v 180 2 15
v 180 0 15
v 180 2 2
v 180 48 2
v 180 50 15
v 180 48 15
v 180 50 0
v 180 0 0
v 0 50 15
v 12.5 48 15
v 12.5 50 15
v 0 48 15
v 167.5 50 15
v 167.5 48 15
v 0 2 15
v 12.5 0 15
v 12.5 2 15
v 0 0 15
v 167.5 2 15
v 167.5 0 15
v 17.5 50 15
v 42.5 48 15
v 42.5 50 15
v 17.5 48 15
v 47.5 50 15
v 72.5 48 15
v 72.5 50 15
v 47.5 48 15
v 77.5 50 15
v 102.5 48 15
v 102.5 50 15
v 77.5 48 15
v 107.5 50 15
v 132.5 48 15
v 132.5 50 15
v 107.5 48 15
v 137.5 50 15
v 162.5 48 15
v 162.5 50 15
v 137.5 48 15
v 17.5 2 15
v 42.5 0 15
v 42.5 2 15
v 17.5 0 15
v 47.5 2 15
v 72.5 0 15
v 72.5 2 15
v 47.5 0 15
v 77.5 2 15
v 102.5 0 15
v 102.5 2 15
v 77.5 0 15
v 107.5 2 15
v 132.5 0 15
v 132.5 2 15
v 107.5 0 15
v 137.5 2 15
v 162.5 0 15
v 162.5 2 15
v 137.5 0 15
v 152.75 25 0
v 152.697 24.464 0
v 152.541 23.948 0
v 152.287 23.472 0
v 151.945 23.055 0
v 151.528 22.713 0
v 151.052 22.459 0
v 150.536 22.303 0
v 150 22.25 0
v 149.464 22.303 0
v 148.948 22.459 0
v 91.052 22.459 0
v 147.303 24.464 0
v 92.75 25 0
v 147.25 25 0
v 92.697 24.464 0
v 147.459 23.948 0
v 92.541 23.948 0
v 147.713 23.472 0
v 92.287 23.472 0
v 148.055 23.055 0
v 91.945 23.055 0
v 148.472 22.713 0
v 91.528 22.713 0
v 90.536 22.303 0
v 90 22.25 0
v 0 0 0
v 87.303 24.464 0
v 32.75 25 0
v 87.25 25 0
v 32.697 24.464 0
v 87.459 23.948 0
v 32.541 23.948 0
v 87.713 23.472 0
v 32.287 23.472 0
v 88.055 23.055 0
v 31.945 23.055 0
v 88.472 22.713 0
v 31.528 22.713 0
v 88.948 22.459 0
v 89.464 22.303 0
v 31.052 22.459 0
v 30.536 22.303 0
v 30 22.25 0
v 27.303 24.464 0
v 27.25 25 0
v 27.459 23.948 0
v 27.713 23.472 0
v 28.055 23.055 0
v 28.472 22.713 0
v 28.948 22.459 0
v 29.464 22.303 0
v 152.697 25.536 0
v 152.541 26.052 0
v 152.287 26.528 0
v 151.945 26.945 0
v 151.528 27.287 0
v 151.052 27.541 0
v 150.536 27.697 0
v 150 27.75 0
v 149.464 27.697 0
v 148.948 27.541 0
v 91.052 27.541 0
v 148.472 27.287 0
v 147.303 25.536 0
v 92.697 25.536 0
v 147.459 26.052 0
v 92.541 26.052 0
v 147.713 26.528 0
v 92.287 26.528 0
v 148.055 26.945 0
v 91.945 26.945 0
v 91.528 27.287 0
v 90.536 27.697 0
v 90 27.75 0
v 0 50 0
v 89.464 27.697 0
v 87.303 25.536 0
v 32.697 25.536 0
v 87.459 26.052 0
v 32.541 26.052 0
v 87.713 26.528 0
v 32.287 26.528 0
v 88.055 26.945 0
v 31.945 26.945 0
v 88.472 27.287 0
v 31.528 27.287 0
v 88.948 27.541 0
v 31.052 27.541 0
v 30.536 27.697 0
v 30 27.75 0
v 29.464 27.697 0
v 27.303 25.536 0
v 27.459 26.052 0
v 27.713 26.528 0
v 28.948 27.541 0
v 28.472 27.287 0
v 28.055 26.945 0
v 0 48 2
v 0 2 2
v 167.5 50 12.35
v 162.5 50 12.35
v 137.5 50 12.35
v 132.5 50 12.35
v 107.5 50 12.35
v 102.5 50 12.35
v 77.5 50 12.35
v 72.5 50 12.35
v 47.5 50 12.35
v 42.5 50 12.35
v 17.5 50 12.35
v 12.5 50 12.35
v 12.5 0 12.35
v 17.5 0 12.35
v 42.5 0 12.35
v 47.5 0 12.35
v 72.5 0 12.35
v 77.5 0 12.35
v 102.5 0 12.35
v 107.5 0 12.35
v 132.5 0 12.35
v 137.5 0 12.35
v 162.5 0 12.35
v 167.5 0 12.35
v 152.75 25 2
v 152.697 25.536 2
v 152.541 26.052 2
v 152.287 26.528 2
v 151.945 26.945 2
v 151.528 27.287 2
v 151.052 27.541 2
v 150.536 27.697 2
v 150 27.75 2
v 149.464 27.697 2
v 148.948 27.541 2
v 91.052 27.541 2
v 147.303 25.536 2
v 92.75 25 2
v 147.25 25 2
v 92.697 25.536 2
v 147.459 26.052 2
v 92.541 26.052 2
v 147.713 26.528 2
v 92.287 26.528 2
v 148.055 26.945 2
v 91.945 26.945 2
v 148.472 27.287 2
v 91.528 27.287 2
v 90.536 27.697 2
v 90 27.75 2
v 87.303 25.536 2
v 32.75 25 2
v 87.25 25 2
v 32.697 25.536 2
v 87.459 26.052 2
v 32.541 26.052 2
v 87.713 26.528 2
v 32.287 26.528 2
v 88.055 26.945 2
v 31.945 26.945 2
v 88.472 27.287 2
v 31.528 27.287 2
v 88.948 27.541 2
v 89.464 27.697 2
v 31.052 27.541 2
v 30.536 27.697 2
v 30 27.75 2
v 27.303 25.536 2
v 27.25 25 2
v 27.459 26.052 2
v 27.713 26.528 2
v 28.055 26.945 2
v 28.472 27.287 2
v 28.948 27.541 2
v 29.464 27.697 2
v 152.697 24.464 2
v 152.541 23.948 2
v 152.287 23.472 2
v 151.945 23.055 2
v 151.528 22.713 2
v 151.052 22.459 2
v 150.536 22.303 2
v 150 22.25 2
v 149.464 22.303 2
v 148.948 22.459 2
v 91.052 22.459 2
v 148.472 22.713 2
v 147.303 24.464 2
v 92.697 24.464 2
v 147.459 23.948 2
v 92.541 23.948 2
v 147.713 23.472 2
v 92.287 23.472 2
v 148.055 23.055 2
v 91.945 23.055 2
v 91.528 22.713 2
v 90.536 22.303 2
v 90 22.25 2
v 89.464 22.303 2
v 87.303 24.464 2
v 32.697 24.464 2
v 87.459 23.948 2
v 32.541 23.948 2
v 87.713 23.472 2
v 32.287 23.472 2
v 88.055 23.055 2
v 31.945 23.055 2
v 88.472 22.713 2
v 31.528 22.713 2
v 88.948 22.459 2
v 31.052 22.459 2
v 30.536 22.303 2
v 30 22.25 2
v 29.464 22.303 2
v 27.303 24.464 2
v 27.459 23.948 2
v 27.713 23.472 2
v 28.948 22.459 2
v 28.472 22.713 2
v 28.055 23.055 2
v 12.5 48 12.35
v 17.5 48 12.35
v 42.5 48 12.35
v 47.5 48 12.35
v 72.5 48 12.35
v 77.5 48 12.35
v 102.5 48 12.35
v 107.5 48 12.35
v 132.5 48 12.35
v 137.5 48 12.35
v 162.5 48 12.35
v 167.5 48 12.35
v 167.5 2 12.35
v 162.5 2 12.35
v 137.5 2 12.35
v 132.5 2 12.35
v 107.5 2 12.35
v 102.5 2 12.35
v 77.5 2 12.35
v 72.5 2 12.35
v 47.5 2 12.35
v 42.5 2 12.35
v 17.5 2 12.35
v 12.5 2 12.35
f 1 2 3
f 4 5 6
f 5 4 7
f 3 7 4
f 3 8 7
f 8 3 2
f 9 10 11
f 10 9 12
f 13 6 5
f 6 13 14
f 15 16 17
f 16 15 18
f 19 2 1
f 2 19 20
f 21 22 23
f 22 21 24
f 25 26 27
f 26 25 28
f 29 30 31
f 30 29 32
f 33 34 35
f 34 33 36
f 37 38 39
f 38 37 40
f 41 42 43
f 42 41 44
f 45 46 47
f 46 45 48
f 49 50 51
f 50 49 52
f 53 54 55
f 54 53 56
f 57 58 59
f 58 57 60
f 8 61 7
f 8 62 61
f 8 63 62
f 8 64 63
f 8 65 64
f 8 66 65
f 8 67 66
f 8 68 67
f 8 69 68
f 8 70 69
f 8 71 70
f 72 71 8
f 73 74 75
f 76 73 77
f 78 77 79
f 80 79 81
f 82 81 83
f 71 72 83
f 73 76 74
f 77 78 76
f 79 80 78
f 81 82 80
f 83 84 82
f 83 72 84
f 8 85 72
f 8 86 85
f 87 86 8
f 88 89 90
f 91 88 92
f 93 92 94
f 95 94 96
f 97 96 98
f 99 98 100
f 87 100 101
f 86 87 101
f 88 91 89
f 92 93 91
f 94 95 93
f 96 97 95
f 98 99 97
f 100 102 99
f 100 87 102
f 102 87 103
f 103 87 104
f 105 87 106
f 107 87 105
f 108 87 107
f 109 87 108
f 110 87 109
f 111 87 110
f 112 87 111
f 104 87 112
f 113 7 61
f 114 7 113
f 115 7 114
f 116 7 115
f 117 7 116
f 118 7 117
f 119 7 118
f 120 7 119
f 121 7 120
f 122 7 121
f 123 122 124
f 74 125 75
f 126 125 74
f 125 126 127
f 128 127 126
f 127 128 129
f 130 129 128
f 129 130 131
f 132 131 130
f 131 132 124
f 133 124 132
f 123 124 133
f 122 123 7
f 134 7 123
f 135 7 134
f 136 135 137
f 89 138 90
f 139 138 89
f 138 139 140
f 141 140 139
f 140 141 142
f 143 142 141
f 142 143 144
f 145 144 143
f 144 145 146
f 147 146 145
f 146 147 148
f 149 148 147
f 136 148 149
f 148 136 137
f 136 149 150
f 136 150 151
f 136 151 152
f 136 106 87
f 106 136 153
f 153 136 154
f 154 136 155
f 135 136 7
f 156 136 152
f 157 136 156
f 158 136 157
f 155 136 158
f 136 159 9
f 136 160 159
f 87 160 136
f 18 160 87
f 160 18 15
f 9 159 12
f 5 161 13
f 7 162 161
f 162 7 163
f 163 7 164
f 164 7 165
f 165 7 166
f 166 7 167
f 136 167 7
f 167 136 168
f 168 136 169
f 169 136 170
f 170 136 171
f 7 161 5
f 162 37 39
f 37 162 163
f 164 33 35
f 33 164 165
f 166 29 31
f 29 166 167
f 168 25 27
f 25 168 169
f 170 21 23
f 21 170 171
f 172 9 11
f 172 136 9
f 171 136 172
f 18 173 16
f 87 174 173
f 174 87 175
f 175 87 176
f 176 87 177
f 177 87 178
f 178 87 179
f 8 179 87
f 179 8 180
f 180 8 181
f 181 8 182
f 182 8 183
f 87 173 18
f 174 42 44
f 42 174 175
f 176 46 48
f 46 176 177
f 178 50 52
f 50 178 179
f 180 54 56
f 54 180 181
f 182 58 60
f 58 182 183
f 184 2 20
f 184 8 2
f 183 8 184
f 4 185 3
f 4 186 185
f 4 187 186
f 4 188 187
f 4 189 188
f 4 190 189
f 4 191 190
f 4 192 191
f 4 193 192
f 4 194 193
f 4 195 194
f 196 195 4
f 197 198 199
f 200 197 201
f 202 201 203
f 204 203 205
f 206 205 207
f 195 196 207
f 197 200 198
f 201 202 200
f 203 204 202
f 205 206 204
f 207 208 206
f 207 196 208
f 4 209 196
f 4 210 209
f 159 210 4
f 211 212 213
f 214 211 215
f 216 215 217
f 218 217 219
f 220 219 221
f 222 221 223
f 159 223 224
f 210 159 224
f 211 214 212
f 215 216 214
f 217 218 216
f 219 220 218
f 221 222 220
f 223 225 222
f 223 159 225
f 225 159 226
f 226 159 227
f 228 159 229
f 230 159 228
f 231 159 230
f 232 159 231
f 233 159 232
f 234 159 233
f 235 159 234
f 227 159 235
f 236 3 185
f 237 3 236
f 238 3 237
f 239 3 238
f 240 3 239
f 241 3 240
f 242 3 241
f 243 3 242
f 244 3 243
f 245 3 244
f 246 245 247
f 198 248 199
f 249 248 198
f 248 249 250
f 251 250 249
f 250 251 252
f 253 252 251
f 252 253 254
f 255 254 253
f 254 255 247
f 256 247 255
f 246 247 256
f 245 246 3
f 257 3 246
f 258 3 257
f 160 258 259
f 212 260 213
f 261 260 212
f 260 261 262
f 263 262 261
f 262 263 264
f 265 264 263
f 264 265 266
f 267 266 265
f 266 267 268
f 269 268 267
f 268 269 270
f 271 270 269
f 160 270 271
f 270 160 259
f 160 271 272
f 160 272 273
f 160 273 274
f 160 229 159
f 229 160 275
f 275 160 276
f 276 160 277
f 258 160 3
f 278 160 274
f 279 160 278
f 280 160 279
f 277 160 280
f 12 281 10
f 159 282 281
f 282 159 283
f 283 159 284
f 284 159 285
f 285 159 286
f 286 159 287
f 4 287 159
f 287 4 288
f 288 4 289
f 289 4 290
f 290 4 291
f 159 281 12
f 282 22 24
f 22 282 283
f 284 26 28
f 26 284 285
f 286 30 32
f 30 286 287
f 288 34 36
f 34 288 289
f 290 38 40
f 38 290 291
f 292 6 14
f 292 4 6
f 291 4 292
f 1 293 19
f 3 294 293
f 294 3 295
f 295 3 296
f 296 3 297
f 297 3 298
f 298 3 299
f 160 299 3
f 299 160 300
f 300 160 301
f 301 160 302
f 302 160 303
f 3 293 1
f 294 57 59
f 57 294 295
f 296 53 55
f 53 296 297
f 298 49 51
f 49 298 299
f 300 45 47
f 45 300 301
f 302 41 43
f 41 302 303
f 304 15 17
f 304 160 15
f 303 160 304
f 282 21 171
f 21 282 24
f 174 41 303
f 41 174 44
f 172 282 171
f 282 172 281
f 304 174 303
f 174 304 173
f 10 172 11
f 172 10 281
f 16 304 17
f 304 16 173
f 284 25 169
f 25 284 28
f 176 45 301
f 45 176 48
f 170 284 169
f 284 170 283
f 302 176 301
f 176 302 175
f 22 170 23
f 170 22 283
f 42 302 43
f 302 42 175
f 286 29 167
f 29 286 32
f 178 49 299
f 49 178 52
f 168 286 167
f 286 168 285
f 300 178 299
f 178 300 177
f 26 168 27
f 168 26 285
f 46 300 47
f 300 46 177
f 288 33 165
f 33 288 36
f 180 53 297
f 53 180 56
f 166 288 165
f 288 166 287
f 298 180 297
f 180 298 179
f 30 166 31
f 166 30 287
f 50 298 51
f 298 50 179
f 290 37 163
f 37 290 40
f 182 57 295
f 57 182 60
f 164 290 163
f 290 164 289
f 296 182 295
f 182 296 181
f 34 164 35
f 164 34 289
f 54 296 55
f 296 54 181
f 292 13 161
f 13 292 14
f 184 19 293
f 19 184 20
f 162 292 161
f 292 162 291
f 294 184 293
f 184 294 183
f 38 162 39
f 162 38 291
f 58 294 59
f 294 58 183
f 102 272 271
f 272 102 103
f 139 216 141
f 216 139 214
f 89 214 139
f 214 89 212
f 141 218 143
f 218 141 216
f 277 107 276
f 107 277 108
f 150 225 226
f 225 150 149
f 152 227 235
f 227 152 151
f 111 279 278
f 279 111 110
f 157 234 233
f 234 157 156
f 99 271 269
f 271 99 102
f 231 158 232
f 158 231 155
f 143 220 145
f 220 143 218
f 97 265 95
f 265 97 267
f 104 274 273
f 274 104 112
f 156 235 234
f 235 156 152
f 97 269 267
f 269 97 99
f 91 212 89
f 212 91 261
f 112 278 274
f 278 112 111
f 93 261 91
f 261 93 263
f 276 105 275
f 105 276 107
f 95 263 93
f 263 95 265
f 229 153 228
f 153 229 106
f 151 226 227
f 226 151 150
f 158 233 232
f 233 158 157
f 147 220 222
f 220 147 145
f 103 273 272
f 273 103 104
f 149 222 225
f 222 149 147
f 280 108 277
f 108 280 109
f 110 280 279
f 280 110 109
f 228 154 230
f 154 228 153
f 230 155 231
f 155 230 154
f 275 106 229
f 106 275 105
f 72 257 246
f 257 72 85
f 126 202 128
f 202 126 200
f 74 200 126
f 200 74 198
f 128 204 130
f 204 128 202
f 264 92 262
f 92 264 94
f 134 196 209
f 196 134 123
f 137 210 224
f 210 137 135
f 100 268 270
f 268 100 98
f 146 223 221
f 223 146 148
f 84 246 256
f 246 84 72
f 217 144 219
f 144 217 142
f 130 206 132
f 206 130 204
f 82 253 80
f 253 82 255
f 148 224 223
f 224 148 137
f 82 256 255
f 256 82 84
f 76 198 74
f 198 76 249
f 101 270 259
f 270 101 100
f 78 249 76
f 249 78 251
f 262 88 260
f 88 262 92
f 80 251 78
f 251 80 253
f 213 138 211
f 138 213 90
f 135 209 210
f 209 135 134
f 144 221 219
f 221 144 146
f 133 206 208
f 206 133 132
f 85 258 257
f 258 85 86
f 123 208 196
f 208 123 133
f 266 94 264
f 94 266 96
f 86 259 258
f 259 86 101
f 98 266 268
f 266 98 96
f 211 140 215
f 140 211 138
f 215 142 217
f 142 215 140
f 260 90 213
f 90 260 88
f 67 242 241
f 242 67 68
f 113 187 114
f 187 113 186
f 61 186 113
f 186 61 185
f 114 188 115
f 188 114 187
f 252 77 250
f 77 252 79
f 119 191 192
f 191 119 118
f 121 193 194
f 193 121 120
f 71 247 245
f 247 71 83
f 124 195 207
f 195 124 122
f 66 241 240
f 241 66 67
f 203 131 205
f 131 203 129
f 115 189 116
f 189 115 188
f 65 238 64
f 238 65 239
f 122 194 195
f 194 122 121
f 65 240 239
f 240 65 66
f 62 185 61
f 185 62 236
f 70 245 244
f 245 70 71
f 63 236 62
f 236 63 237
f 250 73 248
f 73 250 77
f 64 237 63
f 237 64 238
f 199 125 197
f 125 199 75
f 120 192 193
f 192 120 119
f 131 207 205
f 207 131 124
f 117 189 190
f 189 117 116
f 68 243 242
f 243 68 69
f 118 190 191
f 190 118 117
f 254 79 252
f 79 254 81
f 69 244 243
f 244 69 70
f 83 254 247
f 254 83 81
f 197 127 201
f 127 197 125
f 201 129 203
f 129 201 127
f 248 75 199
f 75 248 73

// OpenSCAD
$fn = 32;

// ----------------------------------------------------------------------
// Cable duct: 180 x 50 x 15 mm, 6 fingers
// ----------------------------------------------------------------------

// --- parameters (mm) ---
tray_len = 180;           // duct length, X
tray_w = 50;              // duct width, Y
tray_h = 15;              // duct height, Z
tray_t = 2;               // side wall thickness
floor_t = 2;              // floor thickness
slot_w = 5;               // finger slot width
slot_h = 10.35;           // finger slot height
fingers = 6;              // number of finger slots per side
pitch = 30;               // finger pitch
hole_d = 5.5;             // floor mounting hole
hole_n = 3;               // mounting holes in the floor

module shell() {
  difference() {
    cube([tray_len, tray_w, tray_h]);
    /* open top channel */
    translate([-tray_t - 1, tray_t, floor_t])
      cube([tray_len + 2 * tray_t + 2, tray_w - 2 * tray_t, tray_h + 1]);
  }
}

difference() {
  union() {
    shell();
  }
  /* finger slots cut through both side walls */
  for (i = [0 : fingers - 1]) translate([pitch / 2 + i * pitch - slot_w / 2, -1, floor_t + slot_h]) cube([slot_w, tray_w + 2, tray_h]);
  for (i = [0 : hole_n - 1]) translate([(tray_len / hole_n) * (i + 0.5), tray_w / 2, -1]) cylinder(h = floor_t + 2, d = hole_d);
}
